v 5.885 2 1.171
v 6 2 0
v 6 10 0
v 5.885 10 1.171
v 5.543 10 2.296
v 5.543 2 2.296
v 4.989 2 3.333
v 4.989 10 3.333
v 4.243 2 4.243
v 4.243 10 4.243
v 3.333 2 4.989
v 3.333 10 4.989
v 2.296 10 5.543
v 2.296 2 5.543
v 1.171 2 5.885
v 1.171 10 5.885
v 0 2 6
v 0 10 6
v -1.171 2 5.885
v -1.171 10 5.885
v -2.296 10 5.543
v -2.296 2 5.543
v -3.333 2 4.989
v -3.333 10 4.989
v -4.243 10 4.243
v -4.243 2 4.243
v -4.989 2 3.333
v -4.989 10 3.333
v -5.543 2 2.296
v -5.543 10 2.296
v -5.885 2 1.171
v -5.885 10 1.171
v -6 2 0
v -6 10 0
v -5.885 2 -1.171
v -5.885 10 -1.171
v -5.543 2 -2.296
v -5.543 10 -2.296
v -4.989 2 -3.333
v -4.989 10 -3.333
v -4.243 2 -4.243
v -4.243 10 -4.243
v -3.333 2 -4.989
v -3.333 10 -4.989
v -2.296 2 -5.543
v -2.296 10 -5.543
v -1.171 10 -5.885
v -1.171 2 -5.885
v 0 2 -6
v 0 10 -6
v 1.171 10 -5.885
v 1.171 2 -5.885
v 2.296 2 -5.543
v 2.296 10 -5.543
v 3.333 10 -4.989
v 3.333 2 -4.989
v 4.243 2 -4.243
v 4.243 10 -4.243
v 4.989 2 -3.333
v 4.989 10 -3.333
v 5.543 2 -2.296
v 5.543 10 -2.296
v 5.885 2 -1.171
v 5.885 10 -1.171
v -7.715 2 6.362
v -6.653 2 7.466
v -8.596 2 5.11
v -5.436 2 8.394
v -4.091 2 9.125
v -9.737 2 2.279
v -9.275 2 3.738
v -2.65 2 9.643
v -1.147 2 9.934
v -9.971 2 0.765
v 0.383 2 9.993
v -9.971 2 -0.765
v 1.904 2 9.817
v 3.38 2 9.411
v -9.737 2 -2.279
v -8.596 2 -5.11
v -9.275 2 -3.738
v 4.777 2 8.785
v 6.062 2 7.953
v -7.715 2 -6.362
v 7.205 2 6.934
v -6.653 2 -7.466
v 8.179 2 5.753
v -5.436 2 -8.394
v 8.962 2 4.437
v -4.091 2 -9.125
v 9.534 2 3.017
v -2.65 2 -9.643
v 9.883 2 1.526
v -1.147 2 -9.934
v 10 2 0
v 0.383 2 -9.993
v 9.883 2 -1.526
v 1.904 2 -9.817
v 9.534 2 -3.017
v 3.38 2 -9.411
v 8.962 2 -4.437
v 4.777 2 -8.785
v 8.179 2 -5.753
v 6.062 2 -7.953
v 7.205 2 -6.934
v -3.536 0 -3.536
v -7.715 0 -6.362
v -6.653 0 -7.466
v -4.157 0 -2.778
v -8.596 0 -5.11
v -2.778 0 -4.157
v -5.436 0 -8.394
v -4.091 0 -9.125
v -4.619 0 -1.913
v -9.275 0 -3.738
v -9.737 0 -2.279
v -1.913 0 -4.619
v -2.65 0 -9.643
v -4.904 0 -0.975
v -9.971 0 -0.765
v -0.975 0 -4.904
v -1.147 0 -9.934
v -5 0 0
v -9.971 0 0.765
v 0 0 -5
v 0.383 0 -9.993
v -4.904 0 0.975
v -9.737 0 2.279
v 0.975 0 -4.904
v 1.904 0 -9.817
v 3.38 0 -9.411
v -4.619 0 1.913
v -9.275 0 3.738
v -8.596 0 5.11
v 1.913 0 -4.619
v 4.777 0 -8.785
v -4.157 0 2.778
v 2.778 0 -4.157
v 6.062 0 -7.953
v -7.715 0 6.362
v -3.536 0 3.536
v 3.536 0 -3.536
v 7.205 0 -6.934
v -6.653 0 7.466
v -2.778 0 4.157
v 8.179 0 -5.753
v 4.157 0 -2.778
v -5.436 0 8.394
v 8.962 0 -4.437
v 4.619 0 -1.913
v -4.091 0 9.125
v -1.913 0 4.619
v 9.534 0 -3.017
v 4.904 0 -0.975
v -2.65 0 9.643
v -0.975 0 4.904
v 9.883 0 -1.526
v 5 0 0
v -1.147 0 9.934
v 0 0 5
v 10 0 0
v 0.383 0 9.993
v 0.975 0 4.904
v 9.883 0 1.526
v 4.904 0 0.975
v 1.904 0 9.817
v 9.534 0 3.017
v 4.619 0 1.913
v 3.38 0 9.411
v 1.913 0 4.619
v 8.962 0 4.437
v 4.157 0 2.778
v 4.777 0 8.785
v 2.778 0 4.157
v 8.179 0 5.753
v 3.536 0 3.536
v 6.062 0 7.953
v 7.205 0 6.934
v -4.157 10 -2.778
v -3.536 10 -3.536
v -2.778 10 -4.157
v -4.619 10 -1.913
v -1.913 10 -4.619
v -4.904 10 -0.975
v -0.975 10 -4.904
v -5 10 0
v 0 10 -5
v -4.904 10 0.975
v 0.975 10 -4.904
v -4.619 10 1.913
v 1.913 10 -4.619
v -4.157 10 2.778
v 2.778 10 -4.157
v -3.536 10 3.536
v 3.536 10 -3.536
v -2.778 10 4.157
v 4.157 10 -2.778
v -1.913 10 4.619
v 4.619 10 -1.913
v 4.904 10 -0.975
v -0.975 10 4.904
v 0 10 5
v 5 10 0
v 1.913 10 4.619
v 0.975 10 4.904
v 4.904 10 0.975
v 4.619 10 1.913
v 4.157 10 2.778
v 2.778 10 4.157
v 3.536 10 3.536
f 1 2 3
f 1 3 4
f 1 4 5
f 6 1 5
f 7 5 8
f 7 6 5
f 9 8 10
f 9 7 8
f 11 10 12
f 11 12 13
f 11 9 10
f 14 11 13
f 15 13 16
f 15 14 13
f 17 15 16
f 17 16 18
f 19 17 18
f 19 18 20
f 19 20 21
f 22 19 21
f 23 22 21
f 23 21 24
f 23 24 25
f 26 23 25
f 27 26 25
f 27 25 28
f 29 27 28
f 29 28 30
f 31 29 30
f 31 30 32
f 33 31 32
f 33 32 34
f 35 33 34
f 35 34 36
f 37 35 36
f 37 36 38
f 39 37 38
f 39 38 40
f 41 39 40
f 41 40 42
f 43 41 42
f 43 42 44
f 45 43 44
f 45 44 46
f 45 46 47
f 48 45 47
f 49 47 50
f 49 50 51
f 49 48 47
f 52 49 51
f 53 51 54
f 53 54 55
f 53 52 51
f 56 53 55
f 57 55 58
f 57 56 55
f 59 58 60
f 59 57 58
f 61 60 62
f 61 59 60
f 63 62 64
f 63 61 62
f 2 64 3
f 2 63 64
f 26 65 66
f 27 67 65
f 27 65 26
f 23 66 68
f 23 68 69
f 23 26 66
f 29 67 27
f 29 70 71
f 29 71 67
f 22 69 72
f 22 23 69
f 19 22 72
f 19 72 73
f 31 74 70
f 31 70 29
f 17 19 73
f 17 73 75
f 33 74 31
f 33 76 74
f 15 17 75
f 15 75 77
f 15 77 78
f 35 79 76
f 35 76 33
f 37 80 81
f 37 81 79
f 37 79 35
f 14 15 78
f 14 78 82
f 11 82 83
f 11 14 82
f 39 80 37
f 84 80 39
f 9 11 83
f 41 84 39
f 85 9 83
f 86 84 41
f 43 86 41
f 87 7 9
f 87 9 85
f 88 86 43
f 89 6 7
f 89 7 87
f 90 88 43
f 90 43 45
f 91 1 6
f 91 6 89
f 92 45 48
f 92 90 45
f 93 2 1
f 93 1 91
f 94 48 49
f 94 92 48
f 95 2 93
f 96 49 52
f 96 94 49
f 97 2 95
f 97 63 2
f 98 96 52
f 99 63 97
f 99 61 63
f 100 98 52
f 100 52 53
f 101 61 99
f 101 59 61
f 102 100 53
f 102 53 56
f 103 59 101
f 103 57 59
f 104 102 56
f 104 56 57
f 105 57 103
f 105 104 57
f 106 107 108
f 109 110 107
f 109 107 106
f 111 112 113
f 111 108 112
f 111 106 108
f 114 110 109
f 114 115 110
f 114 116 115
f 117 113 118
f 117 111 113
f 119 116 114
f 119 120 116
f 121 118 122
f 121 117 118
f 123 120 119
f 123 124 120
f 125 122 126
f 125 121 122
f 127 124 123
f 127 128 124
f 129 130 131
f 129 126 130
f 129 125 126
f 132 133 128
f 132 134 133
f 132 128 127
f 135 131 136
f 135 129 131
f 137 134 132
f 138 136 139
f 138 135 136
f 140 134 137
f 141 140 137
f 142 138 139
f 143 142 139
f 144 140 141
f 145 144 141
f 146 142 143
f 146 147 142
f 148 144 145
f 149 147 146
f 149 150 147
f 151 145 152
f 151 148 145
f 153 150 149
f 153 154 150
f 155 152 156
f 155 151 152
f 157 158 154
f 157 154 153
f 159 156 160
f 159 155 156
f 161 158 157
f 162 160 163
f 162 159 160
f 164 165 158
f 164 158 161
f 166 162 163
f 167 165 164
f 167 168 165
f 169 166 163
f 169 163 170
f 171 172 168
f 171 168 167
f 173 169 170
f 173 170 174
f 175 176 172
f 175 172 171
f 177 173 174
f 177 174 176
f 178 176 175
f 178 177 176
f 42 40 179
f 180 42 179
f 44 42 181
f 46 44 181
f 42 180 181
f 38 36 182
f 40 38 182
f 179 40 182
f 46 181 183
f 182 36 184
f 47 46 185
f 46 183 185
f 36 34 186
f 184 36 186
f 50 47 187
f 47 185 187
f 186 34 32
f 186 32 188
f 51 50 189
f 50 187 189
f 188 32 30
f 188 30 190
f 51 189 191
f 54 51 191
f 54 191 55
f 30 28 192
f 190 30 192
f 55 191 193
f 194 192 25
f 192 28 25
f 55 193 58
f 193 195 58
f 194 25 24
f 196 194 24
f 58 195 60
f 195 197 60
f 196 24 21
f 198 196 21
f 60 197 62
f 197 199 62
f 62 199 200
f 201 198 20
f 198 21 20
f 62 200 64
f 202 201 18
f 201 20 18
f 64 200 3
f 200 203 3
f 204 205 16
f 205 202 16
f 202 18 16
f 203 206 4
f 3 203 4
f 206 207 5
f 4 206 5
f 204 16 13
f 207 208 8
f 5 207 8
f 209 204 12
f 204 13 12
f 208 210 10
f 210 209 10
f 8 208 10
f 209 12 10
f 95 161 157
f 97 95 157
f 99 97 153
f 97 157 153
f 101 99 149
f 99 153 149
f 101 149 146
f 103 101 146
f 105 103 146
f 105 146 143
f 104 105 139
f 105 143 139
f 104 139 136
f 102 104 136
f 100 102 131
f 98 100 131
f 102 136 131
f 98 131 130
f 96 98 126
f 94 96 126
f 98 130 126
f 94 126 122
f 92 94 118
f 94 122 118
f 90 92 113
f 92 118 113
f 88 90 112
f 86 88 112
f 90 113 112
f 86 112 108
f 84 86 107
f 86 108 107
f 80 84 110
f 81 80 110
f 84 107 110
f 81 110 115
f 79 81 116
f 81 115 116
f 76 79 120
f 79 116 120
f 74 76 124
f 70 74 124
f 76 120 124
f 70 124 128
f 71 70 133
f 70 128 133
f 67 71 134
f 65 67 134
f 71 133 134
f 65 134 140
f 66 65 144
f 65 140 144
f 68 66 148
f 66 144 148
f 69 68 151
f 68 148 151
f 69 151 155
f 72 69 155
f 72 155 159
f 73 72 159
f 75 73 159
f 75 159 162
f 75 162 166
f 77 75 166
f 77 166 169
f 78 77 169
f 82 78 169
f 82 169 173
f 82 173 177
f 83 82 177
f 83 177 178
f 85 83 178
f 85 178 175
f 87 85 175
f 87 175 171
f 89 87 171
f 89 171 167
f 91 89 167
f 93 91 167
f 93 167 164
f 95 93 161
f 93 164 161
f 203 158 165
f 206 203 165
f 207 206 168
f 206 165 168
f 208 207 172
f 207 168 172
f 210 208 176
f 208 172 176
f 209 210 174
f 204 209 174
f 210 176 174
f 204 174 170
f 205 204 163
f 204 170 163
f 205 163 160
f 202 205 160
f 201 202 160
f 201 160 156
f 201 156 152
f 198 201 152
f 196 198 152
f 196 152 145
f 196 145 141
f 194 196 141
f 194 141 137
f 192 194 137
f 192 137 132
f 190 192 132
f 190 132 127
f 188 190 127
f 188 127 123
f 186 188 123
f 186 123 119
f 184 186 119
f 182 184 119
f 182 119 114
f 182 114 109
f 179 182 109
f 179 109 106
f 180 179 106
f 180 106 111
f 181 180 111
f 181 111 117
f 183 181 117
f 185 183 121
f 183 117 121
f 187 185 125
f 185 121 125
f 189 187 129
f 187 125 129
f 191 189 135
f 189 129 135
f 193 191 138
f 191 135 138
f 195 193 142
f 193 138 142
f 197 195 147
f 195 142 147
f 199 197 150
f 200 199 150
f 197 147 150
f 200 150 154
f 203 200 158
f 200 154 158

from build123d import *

# Parameters (mm, degrees)
SKETCH1_R           = 10
BOSS_EXTRUDE1_DEPTH = 2
SKETCH3_R           = 6
SKETCH3_R_2         = 5
BOSS_EXTRUDE2_DEPTH = 10
SKETCH4_R           = 5
CUT_EXTRUDE2_DEPTH  = 10


with BuildPart() as part:
    # Sketch1 → Boss-Extrude1 (new body)
    with BuildSketch(Plane(origin=(0, 0, 0), x_dir=(1, 0, 0), z_dir=(0, 1, 0))):
        Circle(SKETCH1_R)
    extrude(amount=BOSS_EXTRUDE1_DEPTH)

    # Sketch3 → Boss-Extrude2 (add)
    with BuildSketch(Plane.XZ):
        Circle(SKETCH3_R)
        Circle(SKETCH3_R_2, mode=Mode.SUBTRACT)
    extrude(amount=-BOSS_EXTRUDE2_DEPTH)

    # Sketch4 → Cut-Extrude2 (cut)
    with BuildSketch(Plane.XZ):
        Circle(SKETCH4_R)
    extrude(amount=-CUT_EXTRUDE2_DEPTH, mode=Mode.SUBTRACT)


solid = part.part
